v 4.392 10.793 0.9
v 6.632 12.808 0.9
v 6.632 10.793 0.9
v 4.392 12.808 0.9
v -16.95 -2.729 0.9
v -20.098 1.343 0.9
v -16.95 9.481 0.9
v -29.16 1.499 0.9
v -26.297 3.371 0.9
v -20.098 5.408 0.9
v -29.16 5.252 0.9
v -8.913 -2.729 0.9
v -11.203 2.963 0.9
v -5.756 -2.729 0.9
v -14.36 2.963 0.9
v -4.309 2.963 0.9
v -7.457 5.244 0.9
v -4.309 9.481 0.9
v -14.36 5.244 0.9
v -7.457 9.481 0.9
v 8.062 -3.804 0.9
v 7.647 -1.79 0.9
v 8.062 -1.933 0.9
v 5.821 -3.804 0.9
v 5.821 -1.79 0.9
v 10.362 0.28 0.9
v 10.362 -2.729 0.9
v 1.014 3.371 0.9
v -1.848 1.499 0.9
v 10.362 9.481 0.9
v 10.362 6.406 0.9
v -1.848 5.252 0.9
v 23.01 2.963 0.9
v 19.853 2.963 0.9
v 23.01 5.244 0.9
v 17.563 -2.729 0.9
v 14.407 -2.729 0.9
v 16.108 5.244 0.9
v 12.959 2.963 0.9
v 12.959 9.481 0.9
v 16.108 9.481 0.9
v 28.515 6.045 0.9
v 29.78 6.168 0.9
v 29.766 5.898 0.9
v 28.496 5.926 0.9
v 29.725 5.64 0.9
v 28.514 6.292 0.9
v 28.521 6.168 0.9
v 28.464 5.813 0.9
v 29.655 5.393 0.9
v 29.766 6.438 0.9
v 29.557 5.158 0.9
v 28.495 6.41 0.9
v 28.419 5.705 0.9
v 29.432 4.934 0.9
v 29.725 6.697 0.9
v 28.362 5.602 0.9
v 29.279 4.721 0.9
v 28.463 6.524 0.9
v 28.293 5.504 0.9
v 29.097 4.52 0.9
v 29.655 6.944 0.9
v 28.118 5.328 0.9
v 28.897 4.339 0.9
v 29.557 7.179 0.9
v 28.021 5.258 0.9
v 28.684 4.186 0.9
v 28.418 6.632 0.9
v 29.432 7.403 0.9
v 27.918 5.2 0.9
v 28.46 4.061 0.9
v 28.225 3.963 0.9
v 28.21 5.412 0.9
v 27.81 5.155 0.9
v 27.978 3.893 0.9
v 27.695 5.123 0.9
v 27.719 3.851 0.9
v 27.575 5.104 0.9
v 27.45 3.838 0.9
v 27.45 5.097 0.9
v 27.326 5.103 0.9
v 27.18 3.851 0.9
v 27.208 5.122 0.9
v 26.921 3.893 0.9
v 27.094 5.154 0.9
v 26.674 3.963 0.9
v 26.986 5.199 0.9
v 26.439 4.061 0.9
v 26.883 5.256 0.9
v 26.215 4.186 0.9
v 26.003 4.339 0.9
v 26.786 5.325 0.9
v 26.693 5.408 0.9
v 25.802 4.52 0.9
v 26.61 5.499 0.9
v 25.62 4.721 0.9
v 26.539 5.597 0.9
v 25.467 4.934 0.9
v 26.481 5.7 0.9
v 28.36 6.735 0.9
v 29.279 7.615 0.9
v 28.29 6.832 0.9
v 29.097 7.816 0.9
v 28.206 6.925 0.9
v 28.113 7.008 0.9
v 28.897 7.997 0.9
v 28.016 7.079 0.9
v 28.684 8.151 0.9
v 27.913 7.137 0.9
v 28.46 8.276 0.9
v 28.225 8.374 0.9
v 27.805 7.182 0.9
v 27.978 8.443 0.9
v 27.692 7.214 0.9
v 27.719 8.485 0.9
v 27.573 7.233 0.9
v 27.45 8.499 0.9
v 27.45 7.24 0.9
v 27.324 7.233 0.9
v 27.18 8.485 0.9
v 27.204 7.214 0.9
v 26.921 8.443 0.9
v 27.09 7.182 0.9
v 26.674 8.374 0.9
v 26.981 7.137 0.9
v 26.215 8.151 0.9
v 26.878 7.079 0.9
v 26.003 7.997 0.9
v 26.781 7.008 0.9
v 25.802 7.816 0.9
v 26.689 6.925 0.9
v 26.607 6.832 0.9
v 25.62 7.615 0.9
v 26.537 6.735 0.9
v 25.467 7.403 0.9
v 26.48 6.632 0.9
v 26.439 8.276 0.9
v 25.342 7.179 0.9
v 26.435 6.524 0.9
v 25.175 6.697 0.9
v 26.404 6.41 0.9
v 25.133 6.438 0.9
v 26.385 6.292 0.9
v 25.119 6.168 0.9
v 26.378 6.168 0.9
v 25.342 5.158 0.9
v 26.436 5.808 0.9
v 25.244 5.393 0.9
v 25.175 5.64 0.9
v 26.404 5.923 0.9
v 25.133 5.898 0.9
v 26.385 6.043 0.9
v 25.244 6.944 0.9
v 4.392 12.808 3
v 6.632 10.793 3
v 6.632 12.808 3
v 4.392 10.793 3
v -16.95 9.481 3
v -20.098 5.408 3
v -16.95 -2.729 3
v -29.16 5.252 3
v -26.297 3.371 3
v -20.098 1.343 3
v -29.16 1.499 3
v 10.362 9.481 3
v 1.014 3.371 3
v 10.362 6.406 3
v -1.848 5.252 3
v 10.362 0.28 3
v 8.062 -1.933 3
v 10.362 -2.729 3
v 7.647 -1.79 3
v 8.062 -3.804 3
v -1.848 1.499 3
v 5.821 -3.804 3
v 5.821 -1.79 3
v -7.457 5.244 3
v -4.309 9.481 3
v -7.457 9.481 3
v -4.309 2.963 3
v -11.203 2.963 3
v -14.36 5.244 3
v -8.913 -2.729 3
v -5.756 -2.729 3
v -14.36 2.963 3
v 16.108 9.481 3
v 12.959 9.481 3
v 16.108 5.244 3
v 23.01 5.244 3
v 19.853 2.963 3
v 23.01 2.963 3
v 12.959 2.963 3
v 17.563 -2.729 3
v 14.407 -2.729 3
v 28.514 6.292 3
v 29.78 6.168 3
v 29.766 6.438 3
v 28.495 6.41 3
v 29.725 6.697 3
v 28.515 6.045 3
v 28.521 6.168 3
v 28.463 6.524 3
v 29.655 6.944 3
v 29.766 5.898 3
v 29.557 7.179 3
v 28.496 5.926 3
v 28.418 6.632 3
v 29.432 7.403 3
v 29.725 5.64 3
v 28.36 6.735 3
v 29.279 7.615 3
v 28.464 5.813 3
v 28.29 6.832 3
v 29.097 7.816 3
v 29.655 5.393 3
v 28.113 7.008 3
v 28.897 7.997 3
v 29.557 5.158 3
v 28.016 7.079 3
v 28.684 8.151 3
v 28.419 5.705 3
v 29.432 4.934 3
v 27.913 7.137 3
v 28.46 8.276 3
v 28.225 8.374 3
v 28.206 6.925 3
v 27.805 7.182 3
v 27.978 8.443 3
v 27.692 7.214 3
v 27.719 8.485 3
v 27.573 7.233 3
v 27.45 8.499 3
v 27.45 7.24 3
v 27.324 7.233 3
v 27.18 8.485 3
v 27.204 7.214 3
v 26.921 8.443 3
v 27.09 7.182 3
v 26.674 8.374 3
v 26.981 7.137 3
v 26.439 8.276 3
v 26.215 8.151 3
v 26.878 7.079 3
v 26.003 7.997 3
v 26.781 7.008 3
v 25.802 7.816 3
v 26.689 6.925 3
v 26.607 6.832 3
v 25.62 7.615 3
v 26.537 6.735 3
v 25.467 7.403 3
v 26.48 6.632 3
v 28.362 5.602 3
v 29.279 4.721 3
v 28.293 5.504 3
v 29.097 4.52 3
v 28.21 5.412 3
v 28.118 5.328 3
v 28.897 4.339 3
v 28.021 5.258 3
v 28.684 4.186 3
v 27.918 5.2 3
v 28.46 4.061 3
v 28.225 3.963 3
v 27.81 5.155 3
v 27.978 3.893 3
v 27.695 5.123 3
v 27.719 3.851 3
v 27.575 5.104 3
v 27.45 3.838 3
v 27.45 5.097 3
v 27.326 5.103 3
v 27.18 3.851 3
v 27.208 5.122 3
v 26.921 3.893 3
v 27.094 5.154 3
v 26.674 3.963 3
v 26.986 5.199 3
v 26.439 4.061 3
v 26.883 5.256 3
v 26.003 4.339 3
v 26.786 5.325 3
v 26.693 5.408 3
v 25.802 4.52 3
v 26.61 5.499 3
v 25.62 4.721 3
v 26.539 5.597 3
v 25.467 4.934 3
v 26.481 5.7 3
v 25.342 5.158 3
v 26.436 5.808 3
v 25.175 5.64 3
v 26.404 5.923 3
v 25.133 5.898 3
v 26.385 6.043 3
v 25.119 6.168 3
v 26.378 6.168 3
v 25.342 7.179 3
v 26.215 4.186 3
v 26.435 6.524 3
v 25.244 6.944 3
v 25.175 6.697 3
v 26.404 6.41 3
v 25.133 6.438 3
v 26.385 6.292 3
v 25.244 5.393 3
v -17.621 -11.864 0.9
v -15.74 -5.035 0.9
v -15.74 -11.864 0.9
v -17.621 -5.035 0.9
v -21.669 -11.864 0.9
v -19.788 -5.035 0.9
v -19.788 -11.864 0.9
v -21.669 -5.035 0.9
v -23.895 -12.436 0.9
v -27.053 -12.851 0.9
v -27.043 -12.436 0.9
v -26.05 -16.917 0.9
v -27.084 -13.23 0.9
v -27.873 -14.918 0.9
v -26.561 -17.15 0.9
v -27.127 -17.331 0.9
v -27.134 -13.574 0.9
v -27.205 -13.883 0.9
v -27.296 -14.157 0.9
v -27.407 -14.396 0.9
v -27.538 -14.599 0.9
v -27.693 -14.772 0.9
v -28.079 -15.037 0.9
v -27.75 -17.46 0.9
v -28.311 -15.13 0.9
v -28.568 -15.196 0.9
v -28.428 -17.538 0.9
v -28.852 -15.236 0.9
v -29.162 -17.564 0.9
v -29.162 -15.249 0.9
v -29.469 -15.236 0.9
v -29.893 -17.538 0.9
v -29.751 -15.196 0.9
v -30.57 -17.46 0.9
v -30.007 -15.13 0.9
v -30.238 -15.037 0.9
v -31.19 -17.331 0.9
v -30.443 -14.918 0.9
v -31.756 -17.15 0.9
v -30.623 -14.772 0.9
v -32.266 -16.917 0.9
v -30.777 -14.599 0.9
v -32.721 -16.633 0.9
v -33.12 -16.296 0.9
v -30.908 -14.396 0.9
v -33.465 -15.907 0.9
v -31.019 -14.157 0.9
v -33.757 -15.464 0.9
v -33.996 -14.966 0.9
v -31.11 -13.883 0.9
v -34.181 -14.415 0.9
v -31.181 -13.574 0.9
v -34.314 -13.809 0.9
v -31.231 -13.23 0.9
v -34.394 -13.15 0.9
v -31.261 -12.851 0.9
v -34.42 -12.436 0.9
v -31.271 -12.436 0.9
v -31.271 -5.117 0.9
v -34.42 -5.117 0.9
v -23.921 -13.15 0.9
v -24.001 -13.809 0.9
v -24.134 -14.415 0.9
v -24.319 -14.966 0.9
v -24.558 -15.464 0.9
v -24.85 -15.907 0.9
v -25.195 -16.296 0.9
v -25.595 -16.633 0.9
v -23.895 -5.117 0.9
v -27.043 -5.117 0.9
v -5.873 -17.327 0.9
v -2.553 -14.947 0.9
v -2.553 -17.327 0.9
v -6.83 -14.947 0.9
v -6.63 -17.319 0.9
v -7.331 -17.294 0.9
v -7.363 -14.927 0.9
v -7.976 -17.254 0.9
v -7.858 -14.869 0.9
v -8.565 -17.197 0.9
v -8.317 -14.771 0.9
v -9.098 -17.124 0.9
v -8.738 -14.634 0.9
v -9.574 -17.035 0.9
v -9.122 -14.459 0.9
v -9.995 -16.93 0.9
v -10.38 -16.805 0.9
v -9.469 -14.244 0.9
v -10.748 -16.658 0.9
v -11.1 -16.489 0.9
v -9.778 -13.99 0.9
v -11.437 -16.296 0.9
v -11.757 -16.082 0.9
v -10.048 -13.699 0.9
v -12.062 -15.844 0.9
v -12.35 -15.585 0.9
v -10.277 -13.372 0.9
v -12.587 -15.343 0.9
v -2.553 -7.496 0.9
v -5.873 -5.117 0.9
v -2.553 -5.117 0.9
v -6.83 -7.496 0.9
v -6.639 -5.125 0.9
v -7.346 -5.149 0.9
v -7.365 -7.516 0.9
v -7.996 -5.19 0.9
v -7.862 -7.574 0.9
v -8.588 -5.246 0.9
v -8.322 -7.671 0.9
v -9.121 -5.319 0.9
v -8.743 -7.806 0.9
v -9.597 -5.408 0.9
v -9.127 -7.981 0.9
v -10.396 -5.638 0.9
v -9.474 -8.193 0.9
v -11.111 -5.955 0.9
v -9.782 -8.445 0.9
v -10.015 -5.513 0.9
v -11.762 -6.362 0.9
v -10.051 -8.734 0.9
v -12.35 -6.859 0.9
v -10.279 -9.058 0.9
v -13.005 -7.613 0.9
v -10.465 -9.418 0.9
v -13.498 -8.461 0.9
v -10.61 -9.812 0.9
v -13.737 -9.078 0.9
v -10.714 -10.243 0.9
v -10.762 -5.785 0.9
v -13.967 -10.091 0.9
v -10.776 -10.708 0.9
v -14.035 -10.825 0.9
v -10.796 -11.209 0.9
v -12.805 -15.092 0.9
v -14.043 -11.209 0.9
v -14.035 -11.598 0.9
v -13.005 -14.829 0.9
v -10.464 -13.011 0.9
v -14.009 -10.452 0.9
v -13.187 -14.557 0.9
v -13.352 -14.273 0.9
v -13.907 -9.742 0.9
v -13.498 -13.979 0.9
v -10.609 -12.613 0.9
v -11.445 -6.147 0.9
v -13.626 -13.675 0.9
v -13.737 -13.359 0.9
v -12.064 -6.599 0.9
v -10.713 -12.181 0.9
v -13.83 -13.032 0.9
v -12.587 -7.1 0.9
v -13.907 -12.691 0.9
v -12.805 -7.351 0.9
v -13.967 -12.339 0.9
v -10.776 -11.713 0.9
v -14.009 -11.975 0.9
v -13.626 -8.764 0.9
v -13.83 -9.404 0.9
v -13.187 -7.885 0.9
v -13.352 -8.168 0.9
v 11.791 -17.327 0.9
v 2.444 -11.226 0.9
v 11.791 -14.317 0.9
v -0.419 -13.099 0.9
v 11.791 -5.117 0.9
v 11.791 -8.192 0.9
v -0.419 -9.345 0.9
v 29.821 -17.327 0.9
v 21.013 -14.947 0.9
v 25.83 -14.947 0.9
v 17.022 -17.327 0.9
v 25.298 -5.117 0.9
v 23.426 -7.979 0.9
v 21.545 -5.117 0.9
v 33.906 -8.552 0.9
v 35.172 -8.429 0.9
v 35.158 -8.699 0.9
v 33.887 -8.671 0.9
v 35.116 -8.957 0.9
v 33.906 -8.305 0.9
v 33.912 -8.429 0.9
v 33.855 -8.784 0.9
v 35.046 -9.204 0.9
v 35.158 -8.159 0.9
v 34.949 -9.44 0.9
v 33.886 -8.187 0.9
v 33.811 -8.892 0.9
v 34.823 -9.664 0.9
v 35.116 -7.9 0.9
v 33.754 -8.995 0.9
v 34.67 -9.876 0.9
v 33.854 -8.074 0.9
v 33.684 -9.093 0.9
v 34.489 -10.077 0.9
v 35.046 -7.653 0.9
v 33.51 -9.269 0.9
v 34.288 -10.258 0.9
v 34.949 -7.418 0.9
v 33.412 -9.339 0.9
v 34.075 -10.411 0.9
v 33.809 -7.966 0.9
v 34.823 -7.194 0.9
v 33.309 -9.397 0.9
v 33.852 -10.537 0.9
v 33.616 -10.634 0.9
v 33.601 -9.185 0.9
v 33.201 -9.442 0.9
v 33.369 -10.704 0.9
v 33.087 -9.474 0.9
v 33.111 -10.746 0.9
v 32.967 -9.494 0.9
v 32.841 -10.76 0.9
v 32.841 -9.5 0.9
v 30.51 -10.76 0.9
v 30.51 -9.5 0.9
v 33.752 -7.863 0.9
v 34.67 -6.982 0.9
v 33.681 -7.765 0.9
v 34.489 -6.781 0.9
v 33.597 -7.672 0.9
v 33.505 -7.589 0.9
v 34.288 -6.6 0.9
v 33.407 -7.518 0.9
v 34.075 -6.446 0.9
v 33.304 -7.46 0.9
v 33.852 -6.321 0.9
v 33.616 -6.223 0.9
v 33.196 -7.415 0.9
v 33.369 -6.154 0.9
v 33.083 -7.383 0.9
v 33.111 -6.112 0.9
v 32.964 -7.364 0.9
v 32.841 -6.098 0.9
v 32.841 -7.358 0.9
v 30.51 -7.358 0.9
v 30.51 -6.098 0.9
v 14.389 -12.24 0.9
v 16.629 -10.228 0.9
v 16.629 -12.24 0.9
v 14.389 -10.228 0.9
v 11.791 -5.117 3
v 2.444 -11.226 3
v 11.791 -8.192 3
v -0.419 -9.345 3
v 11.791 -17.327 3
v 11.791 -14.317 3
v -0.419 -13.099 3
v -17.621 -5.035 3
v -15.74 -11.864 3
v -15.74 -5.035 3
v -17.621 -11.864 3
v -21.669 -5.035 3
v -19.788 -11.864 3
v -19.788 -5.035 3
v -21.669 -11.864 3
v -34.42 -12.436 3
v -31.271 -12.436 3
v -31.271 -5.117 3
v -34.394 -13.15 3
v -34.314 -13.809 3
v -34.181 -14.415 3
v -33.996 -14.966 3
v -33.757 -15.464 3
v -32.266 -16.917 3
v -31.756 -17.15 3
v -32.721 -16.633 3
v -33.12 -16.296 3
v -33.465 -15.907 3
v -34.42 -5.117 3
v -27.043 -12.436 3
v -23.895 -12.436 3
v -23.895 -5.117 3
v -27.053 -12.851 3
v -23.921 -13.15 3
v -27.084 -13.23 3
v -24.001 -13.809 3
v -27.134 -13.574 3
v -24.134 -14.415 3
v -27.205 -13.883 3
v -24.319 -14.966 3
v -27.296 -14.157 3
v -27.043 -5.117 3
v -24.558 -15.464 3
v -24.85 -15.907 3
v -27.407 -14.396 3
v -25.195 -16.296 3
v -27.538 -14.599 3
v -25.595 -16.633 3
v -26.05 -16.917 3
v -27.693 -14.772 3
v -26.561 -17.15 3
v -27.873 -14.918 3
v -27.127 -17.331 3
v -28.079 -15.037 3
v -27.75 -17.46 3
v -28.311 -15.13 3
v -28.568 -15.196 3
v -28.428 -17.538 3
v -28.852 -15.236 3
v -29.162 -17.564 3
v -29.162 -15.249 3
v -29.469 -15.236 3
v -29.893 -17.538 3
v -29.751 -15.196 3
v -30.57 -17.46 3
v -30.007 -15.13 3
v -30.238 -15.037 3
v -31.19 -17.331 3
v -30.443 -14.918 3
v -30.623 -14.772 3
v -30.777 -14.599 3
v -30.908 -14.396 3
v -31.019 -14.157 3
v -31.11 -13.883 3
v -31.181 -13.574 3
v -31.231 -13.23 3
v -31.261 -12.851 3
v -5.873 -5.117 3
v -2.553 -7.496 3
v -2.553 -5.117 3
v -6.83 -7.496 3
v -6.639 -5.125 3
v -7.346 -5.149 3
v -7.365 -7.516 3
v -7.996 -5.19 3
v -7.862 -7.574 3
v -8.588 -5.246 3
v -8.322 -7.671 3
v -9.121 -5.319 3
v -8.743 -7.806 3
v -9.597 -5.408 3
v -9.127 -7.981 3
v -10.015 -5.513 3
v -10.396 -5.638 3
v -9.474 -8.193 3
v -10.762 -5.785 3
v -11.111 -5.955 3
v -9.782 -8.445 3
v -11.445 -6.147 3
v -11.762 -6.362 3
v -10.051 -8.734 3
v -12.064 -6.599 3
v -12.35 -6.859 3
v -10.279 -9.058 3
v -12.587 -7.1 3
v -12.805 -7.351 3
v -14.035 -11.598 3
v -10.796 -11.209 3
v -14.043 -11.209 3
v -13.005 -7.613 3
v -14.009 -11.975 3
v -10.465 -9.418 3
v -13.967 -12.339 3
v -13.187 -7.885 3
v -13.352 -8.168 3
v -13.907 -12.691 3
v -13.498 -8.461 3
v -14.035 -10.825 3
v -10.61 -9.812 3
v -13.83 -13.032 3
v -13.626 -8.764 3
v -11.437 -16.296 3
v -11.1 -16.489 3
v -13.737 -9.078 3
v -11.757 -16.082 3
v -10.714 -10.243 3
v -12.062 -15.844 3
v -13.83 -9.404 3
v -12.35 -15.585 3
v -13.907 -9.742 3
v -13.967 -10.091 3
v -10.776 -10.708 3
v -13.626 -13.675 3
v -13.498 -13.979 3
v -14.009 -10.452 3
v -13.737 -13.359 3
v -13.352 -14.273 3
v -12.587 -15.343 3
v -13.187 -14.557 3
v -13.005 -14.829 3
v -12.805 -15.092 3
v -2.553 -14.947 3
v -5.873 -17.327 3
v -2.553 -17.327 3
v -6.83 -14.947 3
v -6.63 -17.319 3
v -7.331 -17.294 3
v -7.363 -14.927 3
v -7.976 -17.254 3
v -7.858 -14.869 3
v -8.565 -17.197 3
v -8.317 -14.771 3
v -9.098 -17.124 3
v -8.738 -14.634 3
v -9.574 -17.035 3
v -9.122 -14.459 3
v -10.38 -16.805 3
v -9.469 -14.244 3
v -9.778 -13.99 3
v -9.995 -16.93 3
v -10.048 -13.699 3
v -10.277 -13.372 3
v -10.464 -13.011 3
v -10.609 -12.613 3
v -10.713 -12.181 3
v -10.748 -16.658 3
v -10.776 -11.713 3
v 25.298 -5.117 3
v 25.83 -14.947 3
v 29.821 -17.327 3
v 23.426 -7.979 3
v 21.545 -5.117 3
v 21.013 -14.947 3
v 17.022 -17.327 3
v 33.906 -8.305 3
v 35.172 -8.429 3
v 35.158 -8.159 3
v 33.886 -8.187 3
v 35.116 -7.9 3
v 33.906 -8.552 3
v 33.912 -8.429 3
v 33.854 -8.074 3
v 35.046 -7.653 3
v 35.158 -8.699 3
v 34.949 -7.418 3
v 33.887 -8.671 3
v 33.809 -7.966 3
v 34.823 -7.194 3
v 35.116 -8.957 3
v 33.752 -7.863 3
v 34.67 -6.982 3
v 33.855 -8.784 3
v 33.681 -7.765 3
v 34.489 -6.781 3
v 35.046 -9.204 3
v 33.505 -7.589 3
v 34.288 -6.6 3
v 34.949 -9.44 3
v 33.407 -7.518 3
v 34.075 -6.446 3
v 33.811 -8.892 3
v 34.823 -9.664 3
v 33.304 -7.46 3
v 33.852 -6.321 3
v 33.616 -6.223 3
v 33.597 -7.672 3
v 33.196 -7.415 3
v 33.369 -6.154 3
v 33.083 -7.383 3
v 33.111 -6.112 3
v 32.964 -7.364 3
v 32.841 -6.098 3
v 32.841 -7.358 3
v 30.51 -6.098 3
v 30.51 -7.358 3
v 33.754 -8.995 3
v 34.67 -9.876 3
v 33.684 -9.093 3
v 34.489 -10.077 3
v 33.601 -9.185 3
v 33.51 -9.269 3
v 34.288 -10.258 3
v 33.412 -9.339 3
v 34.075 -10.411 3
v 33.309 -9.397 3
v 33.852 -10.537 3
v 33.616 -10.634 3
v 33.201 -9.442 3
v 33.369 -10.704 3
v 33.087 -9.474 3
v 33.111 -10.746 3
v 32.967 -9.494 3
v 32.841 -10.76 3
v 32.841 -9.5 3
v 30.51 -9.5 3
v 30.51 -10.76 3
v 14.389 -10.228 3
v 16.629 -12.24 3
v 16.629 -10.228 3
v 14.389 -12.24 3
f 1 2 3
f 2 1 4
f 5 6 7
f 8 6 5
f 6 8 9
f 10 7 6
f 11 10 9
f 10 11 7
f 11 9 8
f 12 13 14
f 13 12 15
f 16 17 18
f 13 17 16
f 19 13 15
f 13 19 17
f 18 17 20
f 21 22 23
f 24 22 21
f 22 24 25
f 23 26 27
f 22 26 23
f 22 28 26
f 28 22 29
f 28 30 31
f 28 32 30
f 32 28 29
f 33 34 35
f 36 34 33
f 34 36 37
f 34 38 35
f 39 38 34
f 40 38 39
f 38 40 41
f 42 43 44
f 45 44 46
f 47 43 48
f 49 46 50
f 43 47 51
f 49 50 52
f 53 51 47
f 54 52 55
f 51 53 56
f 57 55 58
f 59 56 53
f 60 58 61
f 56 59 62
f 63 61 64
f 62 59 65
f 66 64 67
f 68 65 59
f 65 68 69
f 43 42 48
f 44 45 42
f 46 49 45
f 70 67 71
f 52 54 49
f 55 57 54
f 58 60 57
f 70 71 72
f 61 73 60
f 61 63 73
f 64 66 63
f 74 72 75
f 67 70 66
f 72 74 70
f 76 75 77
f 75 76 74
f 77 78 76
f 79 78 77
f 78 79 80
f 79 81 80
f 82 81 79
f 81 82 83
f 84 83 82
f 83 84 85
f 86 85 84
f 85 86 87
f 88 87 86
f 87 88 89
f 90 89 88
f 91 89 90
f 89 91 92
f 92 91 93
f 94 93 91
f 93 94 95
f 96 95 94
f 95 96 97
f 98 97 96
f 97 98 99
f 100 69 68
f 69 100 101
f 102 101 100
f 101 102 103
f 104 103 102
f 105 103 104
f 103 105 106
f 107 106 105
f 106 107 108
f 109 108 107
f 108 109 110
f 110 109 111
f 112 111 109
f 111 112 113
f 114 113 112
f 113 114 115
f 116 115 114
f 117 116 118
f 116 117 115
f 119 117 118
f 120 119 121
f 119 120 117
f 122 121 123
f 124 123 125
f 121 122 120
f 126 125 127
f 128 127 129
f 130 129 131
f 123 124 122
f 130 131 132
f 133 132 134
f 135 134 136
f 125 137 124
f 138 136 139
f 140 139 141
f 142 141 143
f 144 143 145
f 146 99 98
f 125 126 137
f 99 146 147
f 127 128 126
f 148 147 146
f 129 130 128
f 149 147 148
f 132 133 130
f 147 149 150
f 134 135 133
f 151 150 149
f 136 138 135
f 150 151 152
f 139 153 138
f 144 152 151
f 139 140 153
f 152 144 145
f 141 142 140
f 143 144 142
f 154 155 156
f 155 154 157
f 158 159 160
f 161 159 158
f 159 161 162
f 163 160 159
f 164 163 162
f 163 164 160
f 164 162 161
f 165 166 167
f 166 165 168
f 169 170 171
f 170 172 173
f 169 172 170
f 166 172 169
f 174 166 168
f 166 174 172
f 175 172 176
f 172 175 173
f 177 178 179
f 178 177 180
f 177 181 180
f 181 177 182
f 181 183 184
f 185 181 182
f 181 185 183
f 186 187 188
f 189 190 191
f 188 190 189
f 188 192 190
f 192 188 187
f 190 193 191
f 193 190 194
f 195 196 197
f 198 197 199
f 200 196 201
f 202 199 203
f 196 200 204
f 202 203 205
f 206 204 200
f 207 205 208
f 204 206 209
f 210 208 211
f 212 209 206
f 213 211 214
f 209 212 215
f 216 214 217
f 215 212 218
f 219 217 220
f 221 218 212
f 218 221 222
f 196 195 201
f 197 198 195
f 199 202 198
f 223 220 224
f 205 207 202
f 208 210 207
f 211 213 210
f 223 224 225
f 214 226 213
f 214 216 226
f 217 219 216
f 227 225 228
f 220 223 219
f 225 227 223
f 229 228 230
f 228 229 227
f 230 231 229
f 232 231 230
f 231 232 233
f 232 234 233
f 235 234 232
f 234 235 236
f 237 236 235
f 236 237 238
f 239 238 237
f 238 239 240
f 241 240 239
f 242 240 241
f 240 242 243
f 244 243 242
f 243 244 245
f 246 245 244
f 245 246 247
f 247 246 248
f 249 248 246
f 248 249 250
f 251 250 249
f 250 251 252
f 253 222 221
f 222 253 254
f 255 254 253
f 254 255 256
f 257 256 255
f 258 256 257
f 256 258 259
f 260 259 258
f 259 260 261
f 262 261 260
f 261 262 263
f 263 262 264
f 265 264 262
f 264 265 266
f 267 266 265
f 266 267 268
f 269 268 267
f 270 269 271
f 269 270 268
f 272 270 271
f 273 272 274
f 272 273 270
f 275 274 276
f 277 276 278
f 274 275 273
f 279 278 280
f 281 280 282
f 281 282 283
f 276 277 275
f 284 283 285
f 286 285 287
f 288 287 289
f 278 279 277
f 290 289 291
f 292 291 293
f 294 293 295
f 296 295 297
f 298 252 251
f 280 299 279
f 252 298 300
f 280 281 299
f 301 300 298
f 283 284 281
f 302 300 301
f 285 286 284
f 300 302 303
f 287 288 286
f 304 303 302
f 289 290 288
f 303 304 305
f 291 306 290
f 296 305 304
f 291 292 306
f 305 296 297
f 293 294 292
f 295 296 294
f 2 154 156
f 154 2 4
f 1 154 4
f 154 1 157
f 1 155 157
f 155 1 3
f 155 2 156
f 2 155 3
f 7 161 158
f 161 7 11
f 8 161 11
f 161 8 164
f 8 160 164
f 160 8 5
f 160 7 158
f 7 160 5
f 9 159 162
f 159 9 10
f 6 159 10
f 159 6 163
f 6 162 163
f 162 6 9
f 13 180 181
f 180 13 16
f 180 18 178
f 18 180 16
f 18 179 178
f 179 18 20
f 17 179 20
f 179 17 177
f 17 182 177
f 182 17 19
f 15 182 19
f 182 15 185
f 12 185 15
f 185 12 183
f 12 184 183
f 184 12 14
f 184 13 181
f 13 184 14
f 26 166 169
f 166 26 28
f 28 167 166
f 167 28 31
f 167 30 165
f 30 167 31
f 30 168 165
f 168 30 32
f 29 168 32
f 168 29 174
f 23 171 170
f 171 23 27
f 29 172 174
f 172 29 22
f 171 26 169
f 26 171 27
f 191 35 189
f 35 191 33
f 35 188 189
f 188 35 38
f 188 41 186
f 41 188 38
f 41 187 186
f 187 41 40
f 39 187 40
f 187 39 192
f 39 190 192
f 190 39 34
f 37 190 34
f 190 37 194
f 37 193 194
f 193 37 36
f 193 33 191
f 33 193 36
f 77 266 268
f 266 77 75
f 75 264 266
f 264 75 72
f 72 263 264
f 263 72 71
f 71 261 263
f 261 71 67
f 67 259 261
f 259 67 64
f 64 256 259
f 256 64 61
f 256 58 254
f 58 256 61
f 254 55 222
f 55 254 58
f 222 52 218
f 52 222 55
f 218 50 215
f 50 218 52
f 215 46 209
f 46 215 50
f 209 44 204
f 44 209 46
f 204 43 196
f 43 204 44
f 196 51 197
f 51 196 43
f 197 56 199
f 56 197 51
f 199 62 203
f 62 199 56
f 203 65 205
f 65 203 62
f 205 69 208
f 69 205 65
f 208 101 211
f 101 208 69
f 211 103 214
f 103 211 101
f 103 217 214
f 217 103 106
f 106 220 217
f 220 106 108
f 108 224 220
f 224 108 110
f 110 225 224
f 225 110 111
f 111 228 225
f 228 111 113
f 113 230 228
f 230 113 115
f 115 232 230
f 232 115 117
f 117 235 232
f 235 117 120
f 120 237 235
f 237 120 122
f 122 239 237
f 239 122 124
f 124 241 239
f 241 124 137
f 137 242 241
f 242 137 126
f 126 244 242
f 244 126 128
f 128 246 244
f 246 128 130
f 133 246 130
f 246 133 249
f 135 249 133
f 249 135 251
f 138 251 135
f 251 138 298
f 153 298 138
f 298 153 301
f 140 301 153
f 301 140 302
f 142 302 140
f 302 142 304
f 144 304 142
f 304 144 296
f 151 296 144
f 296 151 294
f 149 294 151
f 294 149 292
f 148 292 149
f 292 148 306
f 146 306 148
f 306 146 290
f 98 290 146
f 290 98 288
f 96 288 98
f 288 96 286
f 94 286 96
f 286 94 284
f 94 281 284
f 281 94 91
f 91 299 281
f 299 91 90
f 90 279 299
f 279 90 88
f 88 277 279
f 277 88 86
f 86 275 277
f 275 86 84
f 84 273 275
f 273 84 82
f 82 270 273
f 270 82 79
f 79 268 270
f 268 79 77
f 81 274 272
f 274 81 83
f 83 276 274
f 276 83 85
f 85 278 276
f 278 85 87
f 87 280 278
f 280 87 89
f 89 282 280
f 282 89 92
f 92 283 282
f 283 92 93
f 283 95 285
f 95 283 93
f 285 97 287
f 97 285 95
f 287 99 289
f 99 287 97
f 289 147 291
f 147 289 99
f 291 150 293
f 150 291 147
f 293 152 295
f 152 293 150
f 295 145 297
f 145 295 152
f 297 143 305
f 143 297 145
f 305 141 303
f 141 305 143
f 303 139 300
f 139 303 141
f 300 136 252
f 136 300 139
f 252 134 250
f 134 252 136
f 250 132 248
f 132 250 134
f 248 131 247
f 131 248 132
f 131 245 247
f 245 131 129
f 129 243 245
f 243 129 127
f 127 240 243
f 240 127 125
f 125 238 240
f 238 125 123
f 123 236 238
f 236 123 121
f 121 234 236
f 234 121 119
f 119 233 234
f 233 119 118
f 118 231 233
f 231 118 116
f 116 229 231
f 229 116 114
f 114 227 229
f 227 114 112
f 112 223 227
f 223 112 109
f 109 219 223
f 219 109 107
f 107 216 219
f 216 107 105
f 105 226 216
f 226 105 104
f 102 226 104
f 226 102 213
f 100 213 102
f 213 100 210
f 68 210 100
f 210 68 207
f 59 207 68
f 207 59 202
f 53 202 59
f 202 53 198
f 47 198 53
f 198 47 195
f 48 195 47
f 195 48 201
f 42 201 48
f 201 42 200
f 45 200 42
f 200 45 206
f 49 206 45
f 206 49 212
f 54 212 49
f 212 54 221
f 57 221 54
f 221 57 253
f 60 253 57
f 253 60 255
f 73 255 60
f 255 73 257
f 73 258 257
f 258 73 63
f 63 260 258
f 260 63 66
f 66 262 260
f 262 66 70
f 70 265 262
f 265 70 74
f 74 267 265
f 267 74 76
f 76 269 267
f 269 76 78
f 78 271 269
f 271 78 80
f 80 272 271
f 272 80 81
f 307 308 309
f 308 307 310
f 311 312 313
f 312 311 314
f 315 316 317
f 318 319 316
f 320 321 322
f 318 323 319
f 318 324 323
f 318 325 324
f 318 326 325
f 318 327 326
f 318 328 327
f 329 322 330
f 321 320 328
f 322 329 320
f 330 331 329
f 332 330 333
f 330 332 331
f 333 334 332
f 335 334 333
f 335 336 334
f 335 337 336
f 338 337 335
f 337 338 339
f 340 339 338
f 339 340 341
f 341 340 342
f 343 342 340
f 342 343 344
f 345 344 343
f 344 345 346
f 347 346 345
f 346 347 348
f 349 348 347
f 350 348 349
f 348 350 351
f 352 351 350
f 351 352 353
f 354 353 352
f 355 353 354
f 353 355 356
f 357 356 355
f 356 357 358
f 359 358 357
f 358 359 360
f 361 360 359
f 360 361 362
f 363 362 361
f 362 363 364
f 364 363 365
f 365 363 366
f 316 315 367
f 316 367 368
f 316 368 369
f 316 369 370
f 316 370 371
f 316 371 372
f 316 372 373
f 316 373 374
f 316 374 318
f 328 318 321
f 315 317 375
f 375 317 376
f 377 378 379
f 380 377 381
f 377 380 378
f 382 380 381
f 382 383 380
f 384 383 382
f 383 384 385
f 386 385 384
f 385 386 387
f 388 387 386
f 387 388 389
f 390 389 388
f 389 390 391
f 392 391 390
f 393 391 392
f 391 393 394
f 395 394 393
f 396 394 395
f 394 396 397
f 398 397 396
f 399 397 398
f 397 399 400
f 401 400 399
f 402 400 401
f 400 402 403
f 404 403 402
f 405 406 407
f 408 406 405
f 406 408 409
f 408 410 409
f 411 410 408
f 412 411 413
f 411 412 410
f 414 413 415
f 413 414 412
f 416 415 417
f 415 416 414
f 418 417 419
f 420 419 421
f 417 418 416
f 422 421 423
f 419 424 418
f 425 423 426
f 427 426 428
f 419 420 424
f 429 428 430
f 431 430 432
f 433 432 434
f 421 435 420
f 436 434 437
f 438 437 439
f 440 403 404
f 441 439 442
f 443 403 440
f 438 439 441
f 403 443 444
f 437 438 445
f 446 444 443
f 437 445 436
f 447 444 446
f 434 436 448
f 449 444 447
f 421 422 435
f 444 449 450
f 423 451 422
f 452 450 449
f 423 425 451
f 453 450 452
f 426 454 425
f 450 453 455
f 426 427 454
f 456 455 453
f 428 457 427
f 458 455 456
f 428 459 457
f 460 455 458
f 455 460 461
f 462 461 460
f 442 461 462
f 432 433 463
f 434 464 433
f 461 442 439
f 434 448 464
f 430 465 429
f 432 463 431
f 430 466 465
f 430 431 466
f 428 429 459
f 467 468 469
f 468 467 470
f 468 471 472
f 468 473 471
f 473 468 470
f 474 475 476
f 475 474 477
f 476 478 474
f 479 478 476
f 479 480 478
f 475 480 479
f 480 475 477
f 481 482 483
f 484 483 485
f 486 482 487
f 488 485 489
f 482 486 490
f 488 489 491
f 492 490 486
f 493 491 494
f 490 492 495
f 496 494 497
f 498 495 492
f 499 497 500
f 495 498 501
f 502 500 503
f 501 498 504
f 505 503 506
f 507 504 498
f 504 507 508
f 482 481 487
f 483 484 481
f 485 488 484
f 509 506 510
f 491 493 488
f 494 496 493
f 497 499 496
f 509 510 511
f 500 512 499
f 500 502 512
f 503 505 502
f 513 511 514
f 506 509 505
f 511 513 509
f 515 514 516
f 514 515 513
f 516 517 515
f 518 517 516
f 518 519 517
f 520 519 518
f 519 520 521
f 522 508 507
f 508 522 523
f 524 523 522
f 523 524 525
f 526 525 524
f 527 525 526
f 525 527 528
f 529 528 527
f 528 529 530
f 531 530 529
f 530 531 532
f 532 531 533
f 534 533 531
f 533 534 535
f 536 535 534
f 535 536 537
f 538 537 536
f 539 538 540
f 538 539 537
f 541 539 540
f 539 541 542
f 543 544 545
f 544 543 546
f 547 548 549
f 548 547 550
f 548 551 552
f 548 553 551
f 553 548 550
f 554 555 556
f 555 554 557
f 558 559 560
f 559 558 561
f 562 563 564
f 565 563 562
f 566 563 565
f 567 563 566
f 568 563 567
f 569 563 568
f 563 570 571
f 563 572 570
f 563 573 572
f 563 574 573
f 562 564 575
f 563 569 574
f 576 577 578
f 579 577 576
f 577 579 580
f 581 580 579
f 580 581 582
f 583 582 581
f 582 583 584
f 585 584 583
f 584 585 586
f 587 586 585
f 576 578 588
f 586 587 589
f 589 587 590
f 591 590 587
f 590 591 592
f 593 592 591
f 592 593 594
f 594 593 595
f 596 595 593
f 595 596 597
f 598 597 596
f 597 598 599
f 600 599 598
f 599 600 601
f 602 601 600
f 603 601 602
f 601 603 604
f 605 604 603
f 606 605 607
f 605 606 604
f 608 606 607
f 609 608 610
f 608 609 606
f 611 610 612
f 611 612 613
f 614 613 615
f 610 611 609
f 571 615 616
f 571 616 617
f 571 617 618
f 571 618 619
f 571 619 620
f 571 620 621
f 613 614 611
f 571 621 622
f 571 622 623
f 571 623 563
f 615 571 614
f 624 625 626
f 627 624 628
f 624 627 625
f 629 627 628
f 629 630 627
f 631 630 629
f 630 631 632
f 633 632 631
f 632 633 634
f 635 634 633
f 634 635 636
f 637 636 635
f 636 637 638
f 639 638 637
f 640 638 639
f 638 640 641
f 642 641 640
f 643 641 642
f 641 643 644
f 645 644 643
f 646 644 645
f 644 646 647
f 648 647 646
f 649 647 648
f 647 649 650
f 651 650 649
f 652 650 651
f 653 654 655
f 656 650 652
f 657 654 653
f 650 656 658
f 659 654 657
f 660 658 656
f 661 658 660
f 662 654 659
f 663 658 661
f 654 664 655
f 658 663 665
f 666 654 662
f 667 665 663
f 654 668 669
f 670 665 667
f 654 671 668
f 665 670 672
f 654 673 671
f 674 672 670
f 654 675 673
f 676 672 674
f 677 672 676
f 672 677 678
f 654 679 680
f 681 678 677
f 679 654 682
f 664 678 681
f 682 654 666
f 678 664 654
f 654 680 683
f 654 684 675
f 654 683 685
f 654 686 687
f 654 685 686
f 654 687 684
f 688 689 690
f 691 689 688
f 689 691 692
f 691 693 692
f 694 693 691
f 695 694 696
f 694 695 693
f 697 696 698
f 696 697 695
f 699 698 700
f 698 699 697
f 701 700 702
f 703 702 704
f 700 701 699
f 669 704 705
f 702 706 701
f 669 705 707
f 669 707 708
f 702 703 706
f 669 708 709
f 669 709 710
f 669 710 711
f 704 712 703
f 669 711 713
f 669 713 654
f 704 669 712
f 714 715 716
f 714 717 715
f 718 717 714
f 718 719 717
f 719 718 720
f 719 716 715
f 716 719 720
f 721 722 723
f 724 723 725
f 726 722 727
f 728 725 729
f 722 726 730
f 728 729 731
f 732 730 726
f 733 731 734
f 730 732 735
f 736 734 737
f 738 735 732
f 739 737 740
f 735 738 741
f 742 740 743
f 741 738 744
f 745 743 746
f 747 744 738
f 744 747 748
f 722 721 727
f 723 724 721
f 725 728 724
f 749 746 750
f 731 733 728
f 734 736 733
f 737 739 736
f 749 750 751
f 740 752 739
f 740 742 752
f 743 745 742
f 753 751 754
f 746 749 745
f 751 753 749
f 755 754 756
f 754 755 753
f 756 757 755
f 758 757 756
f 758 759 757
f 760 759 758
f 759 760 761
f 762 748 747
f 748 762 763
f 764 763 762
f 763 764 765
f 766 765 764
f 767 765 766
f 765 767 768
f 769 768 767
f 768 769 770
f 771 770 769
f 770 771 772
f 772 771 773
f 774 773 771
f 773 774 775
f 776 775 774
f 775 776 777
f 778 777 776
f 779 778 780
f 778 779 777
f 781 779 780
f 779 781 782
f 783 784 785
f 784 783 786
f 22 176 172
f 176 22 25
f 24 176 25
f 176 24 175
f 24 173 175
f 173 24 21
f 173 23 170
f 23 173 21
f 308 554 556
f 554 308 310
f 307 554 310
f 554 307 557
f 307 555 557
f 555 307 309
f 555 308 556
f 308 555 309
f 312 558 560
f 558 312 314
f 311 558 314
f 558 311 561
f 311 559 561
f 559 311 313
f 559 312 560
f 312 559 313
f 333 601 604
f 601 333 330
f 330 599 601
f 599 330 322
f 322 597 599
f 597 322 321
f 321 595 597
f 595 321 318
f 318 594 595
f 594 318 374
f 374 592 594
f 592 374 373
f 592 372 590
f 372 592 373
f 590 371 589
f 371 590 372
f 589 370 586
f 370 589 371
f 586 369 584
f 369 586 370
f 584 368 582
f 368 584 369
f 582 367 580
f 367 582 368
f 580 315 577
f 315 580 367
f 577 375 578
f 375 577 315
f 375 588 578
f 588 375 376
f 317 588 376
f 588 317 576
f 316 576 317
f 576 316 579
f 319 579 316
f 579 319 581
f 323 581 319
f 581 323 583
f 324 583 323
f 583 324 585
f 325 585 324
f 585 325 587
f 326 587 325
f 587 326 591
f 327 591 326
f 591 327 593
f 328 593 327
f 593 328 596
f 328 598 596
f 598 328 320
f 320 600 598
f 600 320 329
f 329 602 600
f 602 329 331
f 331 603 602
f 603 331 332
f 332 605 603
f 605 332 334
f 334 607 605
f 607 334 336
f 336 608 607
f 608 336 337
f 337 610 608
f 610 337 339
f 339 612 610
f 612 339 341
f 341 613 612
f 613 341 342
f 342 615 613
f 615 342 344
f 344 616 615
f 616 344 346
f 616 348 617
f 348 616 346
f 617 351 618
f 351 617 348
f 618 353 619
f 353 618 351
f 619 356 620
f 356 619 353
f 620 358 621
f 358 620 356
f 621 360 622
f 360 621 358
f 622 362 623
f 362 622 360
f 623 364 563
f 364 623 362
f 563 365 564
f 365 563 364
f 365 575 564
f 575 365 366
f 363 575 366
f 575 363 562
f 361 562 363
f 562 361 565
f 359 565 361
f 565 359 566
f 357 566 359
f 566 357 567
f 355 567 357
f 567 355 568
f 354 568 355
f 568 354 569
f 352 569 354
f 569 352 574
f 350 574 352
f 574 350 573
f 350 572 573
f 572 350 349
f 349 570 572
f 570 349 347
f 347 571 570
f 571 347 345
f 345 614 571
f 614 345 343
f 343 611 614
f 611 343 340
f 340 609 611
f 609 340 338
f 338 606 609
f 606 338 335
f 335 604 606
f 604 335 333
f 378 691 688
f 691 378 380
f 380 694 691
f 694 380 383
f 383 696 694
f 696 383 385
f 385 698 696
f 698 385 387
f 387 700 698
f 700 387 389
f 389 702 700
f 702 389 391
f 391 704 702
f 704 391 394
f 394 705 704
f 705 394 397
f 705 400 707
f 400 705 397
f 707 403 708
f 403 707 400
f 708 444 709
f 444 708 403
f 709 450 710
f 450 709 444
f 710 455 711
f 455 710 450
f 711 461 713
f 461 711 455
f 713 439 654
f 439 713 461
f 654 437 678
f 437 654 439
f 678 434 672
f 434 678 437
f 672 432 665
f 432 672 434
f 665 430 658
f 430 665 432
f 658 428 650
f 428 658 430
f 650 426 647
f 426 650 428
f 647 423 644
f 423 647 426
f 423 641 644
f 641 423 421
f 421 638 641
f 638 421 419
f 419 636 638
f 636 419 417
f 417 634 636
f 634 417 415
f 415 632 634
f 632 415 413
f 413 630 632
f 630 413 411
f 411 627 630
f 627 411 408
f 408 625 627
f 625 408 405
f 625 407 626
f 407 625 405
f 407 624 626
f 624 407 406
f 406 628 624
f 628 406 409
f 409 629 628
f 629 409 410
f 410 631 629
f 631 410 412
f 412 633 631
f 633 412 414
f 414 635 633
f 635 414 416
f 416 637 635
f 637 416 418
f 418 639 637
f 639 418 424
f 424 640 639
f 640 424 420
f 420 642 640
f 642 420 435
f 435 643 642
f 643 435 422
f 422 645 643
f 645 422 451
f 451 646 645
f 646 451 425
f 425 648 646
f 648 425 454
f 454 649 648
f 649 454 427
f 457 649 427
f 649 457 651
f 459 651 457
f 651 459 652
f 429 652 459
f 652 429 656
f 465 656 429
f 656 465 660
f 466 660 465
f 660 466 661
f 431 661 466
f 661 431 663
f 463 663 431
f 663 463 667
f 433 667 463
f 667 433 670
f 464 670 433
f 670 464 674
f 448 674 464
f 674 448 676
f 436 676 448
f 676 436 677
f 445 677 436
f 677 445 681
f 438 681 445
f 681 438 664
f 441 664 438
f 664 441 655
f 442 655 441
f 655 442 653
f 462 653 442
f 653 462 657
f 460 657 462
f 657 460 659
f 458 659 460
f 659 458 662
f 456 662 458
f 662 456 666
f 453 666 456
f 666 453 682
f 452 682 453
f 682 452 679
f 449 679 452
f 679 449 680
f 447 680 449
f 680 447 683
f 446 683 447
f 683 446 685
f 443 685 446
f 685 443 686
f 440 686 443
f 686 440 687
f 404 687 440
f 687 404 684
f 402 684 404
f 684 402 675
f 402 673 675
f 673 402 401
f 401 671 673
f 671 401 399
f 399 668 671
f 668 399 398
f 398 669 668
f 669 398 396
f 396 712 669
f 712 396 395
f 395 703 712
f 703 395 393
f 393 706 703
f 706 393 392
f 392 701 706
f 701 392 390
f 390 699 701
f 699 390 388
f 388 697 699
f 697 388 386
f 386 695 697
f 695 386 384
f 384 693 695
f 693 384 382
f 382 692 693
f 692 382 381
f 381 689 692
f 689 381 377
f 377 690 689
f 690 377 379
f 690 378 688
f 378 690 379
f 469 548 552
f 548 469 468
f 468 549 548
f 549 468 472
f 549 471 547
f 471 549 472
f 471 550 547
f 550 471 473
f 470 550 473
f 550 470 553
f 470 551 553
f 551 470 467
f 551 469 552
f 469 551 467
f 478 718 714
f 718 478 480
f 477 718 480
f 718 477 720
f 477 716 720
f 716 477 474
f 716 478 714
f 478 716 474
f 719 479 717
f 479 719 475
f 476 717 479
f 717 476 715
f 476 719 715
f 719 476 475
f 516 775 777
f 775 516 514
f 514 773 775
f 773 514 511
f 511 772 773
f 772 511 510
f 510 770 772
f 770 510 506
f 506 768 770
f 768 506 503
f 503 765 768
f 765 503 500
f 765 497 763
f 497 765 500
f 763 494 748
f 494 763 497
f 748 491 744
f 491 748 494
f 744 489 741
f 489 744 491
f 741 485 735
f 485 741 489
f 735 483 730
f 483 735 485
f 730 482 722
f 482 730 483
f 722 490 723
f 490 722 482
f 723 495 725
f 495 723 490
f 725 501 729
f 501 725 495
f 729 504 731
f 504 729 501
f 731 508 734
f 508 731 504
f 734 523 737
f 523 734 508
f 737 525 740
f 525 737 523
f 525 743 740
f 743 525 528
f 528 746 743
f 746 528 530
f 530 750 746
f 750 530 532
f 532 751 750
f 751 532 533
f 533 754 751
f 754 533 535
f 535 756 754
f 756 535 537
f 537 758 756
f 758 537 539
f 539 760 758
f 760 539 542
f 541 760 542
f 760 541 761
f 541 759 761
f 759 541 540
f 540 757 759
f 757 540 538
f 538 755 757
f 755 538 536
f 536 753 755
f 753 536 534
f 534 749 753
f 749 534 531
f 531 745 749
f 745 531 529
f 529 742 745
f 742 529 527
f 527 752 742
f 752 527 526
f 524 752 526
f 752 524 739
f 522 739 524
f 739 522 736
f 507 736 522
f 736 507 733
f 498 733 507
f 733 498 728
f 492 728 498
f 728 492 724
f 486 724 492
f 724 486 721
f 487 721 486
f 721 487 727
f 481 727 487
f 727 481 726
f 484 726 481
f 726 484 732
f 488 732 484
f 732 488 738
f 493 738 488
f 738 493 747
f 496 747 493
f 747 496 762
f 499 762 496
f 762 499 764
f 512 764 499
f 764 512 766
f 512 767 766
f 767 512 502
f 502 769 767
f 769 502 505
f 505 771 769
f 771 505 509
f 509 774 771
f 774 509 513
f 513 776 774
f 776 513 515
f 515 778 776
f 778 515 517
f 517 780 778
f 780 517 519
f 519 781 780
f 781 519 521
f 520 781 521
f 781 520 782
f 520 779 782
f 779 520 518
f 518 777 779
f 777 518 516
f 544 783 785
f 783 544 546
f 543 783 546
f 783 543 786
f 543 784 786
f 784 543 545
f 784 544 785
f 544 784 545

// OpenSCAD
$fn = 48;
  // syllabics (overlaid on icon, tallest)
  translate([0, 4.857, 0.900]) linear_extrude(height=2.100) text("ᐊᔪᐹᔭᐤ", size=12.060, halign="center", valign="center", font="Euphemia UCAS:style=Bold");
  translate([0, -9.857, 0.900]) linear_extrude(height=2.100) text("ᑌᐦᑕᐹᐎᐣ", size=12.060, halign="center", valign="center", font="Euphemia UCAS:style=Bold");
